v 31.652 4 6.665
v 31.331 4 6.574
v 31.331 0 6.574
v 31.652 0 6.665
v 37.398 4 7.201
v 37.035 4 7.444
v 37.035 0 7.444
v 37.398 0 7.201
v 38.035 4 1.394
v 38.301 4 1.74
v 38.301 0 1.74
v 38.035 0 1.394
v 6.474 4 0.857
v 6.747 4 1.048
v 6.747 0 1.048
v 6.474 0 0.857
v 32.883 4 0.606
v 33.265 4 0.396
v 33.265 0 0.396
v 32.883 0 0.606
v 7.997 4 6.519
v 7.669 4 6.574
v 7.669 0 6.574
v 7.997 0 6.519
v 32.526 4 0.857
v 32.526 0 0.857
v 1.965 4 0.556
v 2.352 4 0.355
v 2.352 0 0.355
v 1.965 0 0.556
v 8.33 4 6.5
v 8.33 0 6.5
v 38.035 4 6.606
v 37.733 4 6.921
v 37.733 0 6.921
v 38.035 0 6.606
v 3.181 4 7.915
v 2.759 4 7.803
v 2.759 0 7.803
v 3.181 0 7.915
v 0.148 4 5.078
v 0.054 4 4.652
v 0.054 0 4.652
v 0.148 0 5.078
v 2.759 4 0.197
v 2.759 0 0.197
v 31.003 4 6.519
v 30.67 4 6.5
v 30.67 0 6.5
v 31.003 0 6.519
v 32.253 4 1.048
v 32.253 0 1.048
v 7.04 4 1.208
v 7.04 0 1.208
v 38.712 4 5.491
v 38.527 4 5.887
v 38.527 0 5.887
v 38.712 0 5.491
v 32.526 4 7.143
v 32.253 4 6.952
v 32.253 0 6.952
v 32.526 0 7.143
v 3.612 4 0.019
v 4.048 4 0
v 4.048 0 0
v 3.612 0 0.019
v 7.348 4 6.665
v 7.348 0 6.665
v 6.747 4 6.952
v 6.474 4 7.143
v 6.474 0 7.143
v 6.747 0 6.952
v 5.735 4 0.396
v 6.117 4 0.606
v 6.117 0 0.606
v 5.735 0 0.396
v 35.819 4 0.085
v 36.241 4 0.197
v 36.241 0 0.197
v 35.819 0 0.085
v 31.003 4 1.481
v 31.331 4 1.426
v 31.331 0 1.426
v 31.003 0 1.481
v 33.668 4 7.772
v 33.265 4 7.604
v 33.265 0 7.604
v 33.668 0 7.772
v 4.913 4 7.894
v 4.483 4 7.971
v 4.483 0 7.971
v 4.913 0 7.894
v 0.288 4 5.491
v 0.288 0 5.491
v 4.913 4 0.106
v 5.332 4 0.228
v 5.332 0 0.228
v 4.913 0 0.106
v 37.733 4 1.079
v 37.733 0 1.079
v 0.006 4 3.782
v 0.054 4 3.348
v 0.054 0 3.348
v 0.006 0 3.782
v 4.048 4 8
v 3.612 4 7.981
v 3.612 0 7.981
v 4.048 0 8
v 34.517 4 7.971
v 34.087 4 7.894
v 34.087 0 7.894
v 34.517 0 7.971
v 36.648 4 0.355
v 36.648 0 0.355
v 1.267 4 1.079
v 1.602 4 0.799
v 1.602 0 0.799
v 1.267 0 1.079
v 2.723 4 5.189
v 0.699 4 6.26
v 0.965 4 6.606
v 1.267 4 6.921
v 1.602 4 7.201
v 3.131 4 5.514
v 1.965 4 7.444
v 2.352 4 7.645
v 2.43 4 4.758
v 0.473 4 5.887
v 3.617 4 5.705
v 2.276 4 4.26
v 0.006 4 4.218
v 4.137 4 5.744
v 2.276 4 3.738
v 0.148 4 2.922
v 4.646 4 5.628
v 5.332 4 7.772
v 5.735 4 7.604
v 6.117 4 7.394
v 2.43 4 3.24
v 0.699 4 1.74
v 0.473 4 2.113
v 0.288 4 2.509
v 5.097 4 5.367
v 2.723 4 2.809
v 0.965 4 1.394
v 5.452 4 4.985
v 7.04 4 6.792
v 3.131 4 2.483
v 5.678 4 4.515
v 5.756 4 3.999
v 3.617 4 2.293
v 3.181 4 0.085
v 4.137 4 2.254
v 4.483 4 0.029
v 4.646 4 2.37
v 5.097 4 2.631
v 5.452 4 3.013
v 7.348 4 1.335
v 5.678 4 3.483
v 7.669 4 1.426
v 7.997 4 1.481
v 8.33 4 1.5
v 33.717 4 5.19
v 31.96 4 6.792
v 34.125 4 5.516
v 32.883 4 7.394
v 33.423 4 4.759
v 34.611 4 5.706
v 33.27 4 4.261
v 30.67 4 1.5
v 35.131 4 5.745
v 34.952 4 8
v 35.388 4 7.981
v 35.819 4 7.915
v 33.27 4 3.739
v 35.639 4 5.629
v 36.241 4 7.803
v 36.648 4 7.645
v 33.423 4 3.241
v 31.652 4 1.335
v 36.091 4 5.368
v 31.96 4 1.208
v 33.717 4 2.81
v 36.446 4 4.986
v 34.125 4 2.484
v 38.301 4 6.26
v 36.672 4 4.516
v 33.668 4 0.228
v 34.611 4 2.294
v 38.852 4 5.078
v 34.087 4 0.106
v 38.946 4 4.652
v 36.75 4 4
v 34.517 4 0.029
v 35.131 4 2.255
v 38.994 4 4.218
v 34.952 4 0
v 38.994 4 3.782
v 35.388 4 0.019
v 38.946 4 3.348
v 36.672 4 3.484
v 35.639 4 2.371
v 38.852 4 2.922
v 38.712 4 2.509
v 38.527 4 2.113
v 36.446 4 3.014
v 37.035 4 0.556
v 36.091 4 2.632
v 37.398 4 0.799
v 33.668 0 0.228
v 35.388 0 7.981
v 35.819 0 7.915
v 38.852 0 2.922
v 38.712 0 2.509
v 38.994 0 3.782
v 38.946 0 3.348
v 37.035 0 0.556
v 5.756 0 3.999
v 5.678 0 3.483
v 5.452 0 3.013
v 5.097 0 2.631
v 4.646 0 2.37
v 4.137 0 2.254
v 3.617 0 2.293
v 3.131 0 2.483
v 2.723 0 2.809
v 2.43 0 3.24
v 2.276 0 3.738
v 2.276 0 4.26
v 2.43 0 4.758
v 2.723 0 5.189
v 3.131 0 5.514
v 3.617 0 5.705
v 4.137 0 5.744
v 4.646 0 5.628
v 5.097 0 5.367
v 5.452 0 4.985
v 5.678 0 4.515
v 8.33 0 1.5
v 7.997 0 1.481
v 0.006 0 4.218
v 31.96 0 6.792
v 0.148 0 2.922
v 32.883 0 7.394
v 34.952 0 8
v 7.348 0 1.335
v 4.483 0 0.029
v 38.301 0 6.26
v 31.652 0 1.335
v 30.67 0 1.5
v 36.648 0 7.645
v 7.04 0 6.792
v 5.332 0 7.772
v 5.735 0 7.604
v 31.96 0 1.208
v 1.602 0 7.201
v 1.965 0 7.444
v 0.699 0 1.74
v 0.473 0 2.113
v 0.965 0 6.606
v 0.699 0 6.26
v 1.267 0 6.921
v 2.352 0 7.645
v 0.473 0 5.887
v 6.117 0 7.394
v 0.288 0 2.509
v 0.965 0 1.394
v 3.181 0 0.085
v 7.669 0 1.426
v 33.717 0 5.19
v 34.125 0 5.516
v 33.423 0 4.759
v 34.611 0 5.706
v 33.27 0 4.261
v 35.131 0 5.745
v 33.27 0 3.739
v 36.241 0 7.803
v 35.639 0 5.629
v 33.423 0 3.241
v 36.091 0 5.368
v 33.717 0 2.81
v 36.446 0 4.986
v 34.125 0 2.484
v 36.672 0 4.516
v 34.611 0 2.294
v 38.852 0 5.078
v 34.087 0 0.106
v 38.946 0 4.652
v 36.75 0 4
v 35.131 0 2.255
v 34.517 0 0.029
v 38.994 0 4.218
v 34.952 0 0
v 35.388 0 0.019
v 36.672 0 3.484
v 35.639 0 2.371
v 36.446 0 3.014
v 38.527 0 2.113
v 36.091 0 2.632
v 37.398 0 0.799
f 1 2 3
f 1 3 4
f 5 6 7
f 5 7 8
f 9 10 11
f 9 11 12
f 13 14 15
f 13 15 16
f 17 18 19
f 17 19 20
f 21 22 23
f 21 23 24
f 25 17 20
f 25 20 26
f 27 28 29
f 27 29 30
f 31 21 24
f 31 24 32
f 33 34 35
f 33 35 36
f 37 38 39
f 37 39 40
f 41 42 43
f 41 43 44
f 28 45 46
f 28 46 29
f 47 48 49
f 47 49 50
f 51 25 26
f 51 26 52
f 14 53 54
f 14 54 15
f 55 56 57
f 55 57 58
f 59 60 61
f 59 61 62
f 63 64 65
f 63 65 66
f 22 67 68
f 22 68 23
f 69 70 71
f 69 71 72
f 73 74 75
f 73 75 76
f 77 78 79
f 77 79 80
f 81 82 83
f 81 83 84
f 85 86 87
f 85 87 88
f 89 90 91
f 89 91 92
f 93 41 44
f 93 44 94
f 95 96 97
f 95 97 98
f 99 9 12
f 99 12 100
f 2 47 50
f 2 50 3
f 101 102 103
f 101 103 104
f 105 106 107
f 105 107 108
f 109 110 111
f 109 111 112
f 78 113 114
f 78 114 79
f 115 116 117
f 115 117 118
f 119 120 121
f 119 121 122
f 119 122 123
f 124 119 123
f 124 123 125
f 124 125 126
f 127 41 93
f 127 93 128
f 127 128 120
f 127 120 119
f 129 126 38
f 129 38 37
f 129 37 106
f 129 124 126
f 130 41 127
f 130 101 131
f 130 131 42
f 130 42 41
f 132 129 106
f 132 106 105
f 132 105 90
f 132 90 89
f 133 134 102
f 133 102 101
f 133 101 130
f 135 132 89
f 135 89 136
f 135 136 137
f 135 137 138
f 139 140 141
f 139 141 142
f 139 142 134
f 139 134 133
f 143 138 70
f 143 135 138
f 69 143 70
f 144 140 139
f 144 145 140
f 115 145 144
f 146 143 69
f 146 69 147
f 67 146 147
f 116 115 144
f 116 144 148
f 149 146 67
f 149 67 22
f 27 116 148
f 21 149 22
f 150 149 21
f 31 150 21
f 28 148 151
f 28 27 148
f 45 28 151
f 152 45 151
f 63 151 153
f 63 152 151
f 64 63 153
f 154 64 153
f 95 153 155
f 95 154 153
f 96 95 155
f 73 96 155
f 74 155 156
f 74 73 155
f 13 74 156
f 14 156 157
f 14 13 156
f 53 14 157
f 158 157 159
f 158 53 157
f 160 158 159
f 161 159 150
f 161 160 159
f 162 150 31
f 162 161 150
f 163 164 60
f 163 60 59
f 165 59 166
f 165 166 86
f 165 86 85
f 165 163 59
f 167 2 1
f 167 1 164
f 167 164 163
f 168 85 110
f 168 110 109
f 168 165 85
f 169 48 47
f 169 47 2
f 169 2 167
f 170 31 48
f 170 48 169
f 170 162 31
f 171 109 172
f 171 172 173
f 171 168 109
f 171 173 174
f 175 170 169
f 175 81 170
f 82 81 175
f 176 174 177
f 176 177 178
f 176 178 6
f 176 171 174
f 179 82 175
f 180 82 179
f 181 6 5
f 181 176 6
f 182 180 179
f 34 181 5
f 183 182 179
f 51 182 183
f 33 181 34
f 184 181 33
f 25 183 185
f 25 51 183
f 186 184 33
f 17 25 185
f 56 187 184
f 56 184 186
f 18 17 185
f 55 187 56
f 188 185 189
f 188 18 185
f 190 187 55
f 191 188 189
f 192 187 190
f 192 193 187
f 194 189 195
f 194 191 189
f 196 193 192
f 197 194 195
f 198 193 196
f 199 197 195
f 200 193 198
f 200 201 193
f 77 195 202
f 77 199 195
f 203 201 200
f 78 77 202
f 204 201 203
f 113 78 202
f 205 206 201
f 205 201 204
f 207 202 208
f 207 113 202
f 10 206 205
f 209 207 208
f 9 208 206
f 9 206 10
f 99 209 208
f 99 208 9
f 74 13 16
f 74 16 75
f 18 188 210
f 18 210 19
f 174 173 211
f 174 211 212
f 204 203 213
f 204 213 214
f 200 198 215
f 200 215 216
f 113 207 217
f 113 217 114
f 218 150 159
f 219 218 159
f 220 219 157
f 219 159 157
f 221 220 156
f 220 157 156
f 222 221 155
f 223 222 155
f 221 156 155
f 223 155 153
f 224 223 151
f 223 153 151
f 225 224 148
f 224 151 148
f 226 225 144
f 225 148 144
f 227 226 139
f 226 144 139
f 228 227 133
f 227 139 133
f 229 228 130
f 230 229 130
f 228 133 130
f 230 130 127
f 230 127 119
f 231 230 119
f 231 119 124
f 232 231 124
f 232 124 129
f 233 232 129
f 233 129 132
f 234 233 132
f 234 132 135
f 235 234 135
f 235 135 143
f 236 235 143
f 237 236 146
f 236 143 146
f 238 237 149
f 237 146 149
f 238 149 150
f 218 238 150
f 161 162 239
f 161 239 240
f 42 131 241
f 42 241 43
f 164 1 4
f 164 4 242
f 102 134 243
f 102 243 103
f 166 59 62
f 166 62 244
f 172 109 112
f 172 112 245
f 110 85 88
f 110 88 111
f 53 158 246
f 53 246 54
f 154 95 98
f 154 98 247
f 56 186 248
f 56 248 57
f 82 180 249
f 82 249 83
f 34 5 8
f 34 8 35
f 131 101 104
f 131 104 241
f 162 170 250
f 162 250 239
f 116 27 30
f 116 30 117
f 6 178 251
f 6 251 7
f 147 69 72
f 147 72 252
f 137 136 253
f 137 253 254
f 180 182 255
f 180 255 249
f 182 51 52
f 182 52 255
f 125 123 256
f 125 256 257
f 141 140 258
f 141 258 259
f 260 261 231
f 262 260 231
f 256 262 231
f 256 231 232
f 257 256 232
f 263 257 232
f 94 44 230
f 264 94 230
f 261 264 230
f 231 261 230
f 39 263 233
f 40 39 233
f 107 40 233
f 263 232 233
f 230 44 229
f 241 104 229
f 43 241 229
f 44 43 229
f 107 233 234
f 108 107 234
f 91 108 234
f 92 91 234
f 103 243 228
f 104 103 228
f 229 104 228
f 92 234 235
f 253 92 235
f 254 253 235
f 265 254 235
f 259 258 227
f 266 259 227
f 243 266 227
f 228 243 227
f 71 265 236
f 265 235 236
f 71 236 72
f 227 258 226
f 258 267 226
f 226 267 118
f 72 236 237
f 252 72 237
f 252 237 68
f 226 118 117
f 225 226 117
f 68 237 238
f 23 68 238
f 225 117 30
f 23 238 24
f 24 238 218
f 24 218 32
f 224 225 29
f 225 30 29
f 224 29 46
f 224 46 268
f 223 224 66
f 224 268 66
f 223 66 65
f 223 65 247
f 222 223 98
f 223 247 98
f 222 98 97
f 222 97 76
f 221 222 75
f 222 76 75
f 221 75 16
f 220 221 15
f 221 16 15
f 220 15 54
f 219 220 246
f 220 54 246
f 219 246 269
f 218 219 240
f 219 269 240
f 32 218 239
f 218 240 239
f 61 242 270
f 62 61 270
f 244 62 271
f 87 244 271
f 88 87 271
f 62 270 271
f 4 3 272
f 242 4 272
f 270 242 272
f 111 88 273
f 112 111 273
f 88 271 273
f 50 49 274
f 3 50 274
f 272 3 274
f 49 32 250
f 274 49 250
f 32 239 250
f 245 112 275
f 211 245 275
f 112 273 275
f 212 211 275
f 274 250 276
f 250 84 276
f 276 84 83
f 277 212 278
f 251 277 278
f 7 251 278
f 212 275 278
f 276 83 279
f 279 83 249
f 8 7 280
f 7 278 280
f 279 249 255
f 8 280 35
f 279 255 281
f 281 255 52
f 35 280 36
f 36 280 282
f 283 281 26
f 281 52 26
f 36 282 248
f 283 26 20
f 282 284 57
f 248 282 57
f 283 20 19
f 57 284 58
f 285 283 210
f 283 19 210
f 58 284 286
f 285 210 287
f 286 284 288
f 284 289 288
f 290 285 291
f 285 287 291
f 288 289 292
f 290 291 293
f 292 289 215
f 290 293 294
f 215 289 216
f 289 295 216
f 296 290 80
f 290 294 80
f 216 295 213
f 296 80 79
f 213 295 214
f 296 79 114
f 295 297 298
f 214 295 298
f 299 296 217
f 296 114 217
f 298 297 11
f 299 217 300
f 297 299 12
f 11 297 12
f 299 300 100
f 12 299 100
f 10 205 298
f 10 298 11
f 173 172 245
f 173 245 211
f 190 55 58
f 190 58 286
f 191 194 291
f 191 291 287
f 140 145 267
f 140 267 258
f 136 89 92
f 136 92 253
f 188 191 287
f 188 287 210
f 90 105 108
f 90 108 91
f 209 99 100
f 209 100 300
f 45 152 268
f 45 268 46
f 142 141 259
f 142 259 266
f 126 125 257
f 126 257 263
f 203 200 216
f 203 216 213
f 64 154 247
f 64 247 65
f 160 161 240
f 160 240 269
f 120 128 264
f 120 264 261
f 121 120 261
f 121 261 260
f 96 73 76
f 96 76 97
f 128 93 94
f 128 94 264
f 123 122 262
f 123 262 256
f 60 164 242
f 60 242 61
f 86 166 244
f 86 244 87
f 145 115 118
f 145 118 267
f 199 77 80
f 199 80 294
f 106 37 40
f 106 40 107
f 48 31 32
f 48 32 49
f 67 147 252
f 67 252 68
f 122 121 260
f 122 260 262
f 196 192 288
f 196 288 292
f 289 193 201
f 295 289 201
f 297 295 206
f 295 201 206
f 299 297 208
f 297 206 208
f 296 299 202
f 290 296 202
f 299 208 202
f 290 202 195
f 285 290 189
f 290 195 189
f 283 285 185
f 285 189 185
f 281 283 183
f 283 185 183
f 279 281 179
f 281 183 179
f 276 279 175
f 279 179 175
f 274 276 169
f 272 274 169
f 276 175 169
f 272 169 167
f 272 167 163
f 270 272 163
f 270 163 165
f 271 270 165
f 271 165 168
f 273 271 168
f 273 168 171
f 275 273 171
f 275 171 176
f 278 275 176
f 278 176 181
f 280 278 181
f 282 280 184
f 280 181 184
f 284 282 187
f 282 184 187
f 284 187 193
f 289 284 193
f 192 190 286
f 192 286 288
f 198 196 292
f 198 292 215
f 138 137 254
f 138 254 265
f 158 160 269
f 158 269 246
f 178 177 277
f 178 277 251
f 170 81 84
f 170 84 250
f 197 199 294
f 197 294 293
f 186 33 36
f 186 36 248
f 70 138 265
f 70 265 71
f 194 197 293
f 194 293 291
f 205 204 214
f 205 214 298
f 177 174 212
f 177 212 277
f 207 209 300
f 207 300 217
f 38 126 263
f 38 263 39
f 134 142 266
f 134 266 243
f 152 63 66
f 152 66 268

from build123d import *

# Parameters (mm, degrees)
SKETCH1_R           = 1.750000093
SKETCH1_R_2         = 1.749998765
BOSS_EXTRUDE1_DEPTH = 4.00000019


with BuildPart() as part:
    # Sketch1 → Boss-Extrude1 (new body)
    with BuildSketch(Plane(origin=(0, 4.00000019, 0), x_dir=(1, 0, 0), z_dir=(0, 1, 0))):
        Polygon((32.525639981, -7.142858114), (32.88276121, -7.393712178), (33.265069127, -7.604169194), (33.66804868, -7.771722972), (34.086868167, -7.894380018), (34.516561776, -7.97067862), (34.952010959, -7.99971167), (35.388030112, -7.981133647), (35.81944108, -7.915167138), (36.241080612, -7.802593987), (36.647960544, -7.644756231), (37.035208195, -7.443531882), (37.39824146, -7.201318163), (37.732720375, -6.920996122), (38.034681231, -6.605904084), (38.300510496, -6.259791087), (38.527049124, -5.886779167), (38.711611181, -5.491307005), (38.85198012, -5.078083836), (38.946498185, -4.652027041), (38.994051516, -4.218208138), (38.994051516, -3.781792009), (38.946498185, -3.347974038), (38.85198012, -2.92191701), (38.711611181, -2.508692909), (38.527049124, -2.11322098), (38.300510496, -1.740208943), (38.034681231, -1.394096995), (37.732720375, -1.079004025), (37.39824146, -0.798682508), (37.035208195, -0.556467974), (36.647960544, -0.355244207), (36.241080612, -0.197406596), (35.81944108, -0.084833708), (35.388030112, -0.0188658), (34.952010959, -0.000288244), (34.516561776, -0.02932176), (34.086868167, -0.105620798), (33.66804868, -0.228277393), (33.265069127, -0.39583139), (32.88276121, -0.606288377), (32.525639981, -0.857143023), (32.252710313, -1.048453967), (31.960248947, -1.208308968), (31.65185824, -1.334734028), (31.331341714, -1.42616895), (31.002659351, -1.481484971), (30.669869855, -1.500000013), (8.330127224, -1.500000013), (7.997341454, -1.481484971), (7.668660954, -1.42616895), (7.348147221, -1.334734028), (7.039752789, -1.208308968), (6.747287232, -1.048453967), (6.474358961, -0.857143023), (6.117243785, -0.606288377), (5.73492609, -0.39583139), (5.331956781, -0.228277393), (4.913132172, -0.105620798), (4.483437166, -0.02932176), (4.047987983, -0.000288244), (3.611967899, -0.0188658), (3.180566011, -0.084833708), (2.758919029, -0.197406596), (2.352046082, -0.355244207), (1.964788884, -0.556467974), (1.601757947, -0.798682508), (1.267276006, -1.079004025), (0.965322892, -1.394096995), (0.699493627, -1.740208943), (0.472952612, -2.11322098), (0.288396404, -2.508692909), (0.148022096, -2.92191701), (0.053500291, -3.347974038), (0.005956274, -3.781792009), (0.005956274, -4.218208138), (0.053500291, -4.652027041), (0.148022096, -5.078083836), (0.288396404, -5.491307005), (0.472952612, -5.886779167), (0.699493627, -6.259791087), (0.965322892, -6.605904084), (1.267276006, -6.920996122), (1.601757947, -7.201318163), (1.964788884, -7.443531882), (2.352046082, -7.644756231), (2.758919029, -7.802593987), (3.180566011, -7.915167138), (3.611967899, -7.981133647), (4.047987983, -7.99971167), (4.483437166, -7.97067862), (4.913132172, -7.894380018), (5.331956781, -7.771722972), (5.73492609, -7.604169194), (6.117243785, -7.393712178), (6.474358961, -7.142858114), (6.747287232, -6.951545831), (7.039752789, -6.791692227), (7.348147221, -6.66526705), (7.668660954, -6.573832128), (7.997341454, -6.518514827), (8.330127224, -6.500000134), (30.669869855, -6.500000134), (31.002659351, -6.518514827), (31.331341714, -6.573832128), (31.65185824, -6.66526705), (31.960248947, -6.791692227), (32.252710313, -6.951545831), align=None)
        with Locations((4.006235525, -3.998948436)):
            Circle(SKETCH1_R, mode=Mode.SUBTRACT)
        with Locations((35.000000078, -3.999998668)):
            Circle(SKETCH1_R_2, mode=Mode.SUBTRACT)
    extrude(amount=-BOSS_EXTRUDE1_DEPTH)


solid = part.part
